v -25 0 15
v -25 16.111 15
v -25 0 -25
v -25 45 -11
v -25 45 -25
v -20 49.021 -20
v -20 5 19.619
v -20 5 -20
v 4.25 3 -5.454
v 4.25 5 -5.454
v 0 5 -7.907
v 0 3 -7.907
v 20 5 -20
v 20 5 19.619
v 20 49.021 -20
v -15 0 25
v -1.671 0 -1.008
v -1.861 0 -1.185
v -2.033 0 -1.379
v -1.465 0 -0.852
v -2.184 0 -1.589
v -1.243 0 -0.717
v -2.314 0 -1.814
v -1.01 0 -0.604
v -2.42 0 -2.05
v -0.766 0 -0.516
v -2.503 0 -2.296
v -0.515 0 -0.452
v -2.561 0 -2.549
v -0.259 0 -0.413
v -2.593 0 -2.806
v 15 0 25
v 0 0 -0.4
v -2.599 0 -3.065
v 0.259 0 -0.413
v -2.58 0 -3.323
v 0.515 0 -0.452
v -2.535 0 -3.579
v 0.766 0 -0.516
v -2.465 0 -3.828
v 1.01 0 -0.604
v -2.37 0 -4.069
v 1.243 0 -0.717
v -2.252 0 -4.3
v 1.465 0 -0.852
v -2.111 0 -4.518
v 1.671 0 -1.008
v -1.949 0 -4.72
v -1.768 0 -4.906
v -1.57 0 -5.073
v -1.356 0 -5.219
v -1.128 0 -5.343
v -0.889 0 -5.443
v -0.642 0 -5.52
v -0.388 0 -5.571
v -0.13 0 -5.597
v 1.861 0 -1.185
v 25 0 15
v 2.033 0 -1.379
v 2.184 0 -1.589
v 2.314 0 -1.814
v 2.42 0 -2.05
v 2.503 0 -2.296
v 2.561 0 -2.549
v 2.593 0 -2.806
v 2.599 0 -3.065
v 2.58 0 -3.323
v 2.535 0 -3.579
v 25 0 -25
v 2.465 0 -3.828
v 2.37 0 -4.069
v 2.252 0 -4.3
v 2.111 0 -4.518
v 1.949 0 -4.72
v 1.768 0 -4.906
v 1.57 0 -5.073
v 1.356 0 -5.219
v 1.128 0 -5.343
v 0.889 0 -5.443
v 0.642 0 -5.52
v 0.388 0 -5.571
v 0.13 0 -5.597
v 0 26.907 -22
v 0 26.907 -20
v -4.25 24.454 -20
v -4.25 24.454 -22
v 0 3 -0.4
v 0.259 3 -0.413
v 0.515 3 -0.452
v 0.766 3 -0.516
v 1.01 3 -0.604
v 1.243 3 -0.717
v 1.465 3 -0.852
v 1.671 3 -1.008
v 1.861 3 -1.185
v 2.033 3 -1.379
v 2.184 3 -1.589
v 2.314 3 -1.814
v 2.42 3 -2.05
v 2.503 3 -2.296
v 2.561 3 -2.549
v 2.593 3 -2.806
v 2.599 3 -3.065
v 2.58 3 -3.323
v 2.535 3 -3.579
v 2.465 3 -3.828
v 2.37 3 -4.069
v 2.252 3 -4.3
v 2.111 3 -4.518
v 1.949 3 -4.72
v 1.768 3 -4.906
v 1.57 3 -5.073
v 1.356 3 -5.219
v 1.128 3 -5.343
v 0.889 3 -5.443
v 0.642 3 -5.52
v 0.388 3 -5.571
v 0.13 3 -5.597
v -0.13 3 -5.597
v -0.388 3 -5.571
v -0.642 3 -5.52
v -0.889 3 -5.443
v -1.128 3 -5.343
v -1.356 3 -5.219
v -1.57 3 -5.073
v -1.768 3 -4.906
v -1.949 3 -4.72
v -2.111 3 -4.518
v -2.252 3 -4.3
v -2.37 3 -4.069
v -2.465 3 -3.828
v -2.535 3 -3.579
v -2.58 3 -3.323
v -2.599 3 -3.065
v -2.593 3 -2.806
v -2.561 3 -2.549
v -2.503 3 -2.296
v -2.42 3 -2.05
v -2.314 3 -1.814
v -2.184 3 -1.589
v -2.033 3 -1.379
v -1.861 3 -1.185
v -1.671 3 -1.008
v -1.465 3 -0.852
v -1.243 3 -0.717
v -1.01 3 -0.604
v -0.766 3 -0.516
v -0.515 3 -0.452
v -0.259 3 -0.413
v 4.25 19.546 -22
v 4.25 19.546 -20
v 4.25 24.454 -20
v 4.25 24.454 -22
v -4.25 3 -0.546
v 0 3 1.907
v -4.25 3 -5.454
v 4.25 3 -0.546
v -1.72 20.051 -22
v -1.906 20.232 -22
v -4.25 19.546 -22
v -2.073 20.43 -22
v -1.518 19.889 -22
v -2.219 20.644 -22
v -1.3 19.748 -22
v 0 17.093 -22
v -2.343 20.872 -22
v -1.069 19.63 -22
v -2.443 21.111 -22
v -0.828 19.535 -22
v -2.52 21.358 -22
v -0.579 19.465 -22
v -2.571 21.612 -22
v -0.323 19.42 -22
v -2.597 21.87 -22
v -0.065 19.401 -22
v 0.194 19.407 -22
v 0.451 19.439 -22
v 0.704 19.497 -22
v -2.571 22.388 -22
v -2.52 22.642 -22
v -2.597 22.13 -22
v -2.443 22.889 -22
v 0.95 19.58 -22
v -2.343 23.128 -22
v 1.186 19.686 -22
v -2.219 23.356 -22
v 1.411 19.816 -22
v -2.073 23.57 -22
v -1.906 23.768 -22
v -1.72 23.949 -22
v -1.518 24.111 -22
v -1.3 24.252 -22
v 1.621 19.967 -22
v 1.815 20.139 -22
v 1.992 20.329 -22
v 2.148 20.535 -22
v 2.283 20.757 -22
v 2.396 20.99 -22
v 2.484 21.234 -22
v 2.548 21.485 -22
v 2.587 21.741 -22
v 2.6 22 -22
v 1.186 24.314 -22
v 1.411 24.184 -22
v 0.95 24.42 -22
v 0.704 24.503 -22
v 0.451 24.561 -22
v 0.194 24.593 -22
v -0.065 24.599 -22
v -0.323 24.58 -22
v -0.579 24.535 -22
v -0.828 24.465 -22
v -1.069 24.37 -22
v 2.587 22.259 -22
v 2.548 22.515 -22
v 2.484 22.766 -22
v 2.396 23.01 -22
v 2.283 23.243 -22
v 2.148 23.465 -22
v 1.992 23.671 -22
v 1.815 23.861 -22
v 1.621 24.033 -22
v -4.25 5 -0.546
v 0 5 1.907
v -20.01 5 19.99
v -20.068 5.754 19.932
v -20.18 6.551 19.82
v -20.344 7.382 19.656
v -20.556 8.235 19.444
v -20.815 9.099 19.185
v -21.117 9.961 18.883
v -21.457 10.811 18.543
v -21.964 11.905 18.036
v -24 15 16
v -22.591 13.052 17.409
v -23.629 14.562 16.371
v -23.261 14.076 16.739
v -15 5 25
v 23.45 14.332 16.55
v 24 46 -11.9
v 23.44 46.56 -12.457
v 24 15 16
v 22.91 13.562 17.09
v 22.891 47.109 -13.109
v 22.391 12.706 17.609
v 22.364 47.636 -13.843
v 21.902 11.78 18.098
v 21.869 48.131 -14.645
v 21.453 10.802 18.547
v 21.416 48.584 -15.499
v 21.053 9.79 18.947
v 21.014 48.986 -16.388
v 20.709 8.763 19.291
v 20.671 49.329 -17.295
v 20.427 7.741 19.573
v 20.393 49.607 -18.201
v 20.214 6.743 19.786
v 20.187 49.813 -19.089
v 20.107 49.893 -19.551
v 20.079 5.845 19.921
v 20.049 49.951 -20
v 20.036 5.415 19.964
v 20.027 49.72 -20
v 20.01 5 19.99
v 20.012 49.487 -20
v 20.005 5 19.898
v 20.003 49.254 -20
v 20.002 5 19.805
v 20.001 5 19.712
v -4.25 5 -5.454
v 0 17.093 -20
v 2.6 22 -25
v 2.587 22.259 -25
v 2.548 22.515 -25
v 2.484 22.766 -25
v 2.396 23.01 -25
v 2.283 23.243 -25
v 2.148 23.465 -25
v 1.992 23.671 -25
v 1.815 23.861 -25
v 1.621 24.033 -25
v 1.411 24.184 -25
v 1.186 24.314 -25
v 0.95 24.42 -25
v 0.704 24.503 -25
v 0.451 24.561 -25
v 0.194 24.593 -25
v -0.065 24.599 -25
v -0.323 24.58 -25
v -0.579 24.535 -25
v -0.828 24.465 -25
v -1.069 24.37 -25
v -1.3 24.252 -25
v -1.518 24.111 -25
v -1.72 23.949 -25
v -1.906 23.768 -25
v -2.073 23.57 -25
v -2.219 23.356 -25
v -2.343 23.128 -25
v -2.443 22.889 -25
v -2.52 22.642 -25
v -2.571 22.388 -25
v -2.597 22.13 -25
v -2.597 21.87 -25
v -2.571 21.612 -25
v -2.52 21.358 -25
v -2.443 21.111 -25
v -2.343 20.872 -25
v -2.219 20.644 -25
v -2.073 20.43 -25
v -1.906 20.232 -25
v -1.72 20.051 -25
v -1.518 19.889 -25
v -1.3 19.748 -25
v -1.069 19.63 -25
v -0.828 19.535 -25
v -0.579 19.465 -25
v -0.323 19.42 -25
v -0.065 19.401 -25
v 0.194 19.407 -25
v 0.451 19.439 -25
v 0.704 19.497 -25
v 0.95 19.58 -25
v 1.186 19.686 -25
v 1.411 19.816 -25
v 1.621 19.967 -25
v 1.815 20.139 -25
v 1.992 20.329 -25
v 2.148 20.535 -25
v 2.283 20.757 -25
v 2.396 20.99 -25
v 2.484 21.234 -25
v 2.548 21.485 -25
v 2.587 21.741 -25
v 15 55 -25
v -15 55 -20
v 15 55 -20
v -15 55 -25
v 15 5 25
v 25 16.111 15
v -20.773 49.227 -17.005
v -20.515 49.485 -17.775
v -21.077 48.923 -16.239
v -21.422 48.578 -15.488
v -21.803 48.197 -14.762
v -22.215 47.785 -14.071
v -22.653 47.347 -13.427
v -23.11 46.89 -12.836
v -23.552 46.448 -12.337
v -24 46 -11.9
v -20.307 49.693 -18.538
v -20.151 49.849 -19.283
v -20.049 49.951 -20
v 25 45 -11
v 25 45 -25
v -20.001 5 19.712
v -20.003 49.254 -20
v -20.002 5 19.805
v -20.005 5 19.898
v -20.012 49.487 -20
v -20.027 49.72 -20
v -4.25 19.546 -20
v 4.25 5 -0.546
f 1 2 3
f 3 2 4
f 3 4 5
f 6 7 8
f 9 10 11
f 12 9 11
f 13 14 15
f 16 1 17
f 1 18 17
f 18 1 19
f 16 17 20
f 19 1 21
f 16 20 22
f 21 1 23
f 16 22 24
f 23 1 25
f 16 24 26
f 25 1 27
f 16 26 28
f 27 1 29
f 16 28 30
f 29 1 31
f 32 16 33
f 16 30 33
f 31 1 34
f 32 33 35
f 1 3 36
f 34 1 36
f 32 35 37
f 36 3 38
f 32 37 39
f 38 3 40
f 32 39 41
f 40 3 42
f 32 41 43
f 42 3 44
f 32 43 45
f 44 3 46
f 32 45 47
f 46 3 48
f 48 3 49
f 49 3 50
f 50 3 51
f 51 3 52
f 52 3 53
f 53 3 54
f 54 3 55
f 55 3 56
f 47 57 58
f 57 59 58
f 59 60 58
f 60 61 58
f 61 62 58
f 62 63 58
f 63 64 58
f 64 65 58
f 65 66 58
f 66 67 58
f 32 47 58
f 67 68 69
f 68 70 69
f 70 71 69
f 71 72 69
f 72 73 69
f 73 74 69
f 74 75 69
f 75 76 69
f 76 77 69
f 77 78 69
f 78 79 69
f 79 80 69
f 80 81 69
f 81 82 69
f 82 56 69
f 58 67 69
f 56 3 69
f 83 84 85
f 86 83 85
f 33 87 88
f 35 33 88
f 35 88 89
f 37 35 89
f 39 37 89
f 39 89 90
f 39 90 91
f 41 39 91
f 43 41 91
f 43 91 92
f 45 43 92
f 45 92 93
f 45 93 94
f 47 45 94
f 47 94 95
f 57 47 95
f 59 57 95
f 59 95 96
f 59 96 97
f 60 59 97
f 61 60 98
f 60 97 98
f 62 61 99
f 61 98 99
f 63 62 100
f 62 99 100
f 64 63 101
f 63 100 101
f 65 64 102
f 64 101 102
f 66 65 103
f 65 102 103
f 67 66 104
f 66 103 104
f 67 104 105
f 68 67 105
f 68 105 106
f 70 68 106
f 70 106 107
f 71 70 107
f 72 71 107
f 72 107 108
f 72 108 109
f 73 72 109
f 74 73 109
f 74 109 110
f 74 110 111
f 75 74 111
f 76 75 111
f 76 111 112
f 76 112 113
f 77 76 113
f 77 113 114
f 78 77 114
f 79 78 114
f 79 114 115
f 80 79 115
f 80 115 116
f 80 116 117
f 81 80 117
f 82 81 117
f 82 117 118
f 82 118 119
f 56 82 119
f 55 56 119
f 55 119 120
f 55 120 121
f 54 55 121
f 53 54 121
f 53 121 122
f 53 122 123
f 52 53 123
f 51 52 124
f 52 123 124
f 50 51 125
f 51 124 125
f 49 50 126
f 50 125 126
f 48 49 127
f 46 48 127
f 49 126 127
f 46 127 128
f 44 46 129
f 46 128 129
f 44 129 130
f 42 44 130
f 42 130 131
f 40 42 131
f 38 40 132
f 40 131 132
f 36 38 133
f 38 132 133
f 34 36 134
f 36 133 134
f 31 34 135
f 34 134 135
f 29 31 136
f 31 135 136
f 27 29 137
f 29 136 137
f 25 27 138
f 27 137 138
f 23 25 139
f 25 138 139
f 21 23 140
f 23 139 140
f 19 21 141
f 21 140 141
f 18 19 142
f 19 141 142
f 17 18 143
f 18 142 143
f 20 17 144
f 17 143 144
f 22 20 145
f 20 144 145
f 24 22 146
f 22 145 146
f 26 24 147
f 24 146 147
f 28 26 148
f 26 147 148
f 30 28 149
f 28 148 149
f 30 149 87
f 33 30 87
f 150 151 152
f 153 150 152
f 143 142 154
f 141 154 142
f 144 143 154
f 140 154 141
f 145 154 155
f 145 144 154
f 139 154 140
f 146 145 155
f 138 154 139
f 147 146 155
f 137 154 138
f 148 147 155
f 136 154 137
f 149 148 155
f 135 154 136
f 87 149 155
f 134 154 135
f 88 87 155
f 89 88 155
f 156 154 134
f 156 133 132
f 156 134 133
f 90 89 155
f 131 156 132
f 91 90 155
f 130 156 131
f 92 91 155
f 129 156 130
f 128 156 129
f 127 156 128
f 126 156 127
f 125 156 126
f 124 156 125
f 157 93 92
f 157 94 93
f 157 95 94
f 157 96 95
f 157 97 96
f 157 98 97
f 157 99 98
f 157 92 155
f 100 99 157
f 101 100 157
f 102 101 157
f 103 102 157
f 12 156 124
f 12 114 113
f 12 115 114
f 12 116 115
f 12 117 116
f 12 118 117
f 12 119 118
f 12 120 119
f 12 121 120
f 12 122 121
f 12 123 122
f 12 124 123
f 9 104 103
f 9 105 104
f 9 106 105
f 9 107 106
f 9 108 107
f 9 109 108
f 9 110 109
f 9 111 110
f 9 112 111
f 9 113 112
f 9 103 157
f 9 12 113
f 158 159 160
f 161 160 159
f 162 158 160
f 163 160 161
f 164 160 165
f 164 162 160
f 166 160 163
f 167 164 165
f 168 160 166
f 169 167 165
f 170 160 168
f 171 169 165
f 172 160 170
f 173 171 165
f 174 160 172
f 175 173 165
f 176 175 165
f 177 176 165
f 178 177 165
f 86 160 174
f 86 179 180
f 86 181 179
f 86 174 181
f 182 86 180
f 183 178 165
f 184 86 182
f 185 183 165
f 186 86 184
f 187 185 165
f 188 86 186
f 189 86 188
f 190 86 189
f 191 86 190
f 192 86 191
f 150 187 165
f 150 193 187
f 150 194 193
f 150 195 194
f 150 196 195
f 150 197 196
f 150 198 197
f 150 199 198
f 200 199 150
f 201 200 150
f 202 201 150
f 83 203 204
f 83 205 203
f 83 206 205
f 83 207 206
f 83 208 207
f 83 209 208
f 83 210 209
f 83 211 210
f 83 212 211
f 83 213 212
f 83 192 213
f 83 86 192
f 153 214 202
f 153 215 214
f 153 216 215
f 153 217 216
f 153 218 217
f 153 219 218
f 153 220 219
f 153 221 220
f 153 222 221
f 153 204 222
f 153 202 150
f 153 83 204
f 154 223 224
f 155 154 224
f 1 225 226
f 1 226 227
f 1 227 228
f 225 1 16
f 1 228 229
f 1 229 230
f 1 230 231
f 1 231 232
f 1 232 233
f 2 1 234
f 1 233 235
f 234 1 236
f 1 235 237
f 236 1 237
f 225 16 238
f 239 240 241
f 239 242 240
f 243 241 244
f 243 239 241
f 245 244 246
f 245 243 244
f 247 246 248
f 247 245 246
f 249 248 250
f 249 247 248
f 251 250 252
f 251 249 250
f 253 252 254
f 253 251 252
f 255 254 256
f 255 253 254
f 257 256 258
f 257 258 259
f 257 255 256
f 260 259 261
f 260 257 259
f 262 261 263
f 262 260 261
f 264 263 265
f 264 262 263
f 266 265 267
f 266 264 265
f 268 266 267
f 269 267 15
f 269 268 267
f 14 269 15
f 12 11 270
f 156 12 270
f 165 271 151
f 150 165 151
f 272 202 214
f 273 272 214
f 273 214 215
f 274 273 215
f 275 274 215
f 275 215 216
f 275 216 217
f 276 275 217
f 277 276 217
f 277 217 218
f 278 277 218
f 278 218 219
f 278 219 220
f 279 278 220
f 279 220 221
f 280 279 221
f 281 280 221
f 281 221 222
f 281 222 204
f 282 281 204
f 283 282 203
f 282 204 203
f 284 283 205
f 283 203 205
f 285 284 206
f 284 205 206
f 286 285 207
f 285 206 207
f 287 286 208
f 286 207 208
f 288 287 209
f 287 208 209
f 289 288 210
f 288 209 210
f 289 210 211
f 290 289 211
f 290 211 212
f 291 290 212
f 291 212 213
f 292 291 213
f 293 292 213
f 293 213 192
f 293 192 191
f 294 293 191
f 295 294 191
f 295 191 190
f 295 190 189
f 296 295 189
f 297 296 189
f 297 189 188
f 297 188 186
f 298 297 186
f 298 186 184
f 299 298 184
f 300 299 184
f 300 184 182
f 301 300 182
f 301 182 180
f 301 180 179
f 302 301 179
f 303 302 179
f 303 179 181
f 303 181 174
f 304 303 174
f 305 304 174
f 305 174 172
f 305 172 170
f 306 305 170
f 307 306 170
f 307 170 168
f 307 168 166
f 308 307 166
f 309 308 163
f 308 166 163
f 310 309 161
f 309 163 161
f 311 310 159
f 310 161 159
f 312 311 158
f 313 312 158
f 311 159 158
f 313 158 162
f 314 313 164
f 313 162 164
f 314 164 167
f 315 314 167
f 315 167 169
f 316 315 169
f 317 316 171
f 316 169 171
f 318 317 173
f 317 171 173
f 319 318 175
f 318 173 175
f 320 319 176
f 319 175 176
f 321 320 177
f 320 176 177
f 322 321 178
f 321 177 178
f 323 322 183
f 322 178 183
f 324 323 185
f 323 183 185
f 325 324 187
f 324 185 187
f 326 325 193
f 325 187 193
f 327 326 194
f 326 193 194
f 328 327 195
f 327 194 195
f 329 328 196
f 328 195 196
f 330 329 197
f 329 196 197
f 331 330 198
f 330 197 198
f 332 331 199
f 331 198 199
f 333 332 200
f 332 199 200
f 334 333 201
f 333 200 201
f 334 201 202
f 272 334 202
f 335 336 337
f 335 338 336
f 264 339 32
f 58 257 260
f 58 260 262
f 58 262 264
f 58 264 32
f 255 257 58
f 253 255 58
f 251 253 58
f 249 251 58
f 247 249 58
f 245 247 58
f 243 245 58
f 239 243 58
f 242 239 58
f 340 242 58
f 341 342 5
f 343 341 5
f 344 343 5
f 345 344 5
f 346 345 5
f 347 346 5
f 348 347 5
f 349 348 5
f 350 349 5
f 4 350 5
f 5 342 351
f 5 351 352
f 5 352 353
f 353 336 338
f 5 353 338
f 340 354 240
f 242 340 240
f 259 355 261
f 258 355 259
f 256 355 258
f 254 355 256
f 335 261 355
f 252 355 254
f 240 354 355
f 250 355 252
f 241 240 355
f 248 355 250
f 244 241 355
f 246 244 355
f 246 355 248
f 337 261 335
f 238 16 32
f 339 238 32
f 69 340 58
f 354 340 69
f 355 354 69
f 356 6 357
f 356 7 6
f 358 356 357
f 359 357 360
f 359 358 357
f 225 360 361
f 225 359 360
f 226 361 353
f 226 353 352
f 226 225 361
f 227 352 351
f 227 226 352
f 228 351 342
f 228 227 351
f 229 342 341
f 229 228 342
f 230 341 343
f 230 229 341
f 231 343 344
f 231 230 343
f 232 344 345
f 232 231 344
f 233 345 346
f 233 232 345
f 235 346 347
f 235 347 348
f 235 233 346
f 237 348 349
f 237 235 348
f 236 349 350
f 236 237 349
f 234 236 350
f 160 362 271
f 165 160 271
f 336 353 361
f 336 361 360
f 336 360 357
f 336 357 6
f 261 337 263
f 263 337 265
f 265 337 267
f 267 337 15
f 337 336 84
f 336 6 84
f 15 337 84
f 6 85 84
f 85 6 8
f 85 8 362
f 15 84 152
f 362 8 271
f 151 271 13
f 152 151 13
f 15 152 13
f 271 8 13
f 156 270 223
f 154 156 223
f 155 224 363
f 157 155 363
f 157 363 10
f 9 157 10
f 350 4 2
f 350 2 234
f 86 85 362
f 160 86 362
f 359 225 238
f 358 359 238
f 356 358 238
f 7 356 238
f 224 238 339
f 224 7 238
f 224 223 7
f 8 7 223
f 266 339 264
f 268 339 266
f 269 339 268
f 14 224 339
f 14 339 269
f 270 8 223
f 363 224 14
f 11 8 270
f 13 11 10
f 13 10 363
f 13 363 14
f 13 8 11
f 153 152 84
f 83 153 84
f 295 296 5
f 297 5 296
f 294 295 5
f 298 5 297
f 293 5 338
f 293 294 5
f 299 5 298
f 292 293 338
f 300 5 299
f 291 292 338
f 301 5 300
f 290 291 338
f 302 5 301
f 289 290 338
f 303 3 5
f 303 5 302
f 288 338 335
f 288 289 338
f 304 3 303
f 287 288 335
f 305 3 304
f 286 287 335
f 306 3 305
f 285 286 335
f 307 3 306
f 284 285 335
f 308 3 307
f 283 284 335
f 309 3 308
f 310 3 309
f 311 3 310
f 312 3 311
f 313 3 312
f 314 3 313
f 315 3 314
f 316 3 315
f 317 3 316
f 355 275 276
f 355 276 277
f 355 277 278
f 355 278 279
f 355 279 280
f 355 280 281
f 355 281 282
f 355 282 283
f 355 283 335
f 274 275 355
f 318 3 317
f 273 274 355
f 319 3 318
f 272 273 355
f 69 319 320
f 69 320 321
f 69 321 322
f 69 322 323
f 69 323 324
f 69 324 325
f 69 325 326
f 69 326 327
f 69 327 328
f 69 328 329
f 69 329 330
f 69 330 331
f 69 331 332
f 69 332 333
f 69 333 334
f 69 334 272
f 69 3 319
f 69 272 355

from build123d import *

# Parameters (mm, degrees)
SKETCH1_W               = 50
SKETCH1_H               = 50
BOSS_EXTRUDE1_DEPTH     = 5
SKETCH2_W               = 50
SKETCH2_H               = 5
BOSS_EXTRUDE2_DEPTH     = 50
SKETCH3_R               = 2.6
CUT_EXTRUDE1_DEPTH      = 50
SKETCH4_R               = 2.6
CUT_EXTRUDE2_DEPTH      = 50
CHAMFER1_SIZE           = 10
CUT_EXTRUDE3_DEPTH      = 2
CUT_EXTRUDE4_DEPTH      = 2
BOSS_EXTRUDE3_DEPTH     = 5
BOSS_EXTRUDE4_START     = -50
BOSS_EXTRUDE4_DEPTH     = 5
CUT_EXTRUDE5_DEPTH      = 66.383484153
CUT_EXTRUDE5_DEPTH_BACK = 66.383484153
CUT_EXTRUDE6_DEPTH      = 79.421935707
CUT_EXTRUDE6_DEPTH_BACK = 79.421935707
FILLET1_R               = 4


with BuildPart() as part:
    # Sketch1 → Boss-Extrude1 (new body)
    with BuildSketch(Plane(origin=(0, 0, 0), x_dir=(1, 0, 0), z_dir=(0, 1, 0))):
        Rectangle(SKETCH1_W, SKETCH1_H)
    extrude(amount=BOSS_EXTRUDE1_DEPTH)

    # Sketch2 → Boss-Extrude2 (add)
    with BuildSketch(Plane(origin=(0, 5, 0), x_dir=(1, 0, 0), z_dir=(0, 1, 0))):
        with Locations((0, 22.5)):
            Rectangle(SKETCH2_W, SKETCH2_H)
    extrude(amount=BOSS_EXTRUDE2_DEPTH)

    # Sketch3 → Cut-Extrude1 (cut)
    with BuildSketch(Plane.XY.offset(-20)):
        with Locations((0, 22)):
            Circle(SKETCH3_R)
    extrude(amount=-CUT_EXTRUDE1_DEPTH, mode=Mode.SUBTRACT)

    # Sketch4 → Cut-Extrude2 (cut)
    with BuildSketch(Plane(origin=(0, 5, 0), x_dir=(1, 0, 0), z_dir=(0, 1, 0))):
        with Locations(Location((0, 3, 0), (0, 0, 270))):
            Circle(SKETCH4_R)
    extrude(amount=-CUT_EXTRUDE2_DEPTH, mode=Mode.SUBTRACT)

    # Chamfer1
    chamfer1_edges = [part.edges().sort_by_distance(p)[0] for p in [
        (25, 55, -22.5),
        (-25, 55, -22.5),
        (25, 2.5, 25),
        (-25, 2.5, 25),
    ]]
    chamfer(chamfer1_edges, length=CHAMFER1_SIZE)

    # Sketch5 → Cut-Extrude3 (cut)
    with BuildSketch(Plane.XY.offset(-20)):
        Polygon((0, 26.907477288), (-4.25, 24.453738644), (-4.25, 19.546261356), (0, 17.092522712), (4.25, 19.546261356), (4.25, 24.453738644), align=None)
    extrude(amount=-CUT_EXTRUDE3_DEPTH, mode=Mode.SUBTRACT)

    # Sketch6 → Cut-Extrude4 (cut)
    with BuildSketch(Plane(origin=(0, 5, 0), x_dir=(1, 0, 0), z_dir=(0, 1, 0))):
        Polygon((0, 7.907477288), (-4.25, 5.453738644), (-4.25, 0.546261356), (0, -1.907477288), (4.25, 0.546261356), (4.25, 5.453738644), align=None)
    extrude(amount=-CUT_EXTRUDE4_DEPTH, mode=Mode.SUBTRACT)

    # Sketch7 → Boss-Extrude3 (add)
    with BuildSketch(Plane.ZY.offset(25)):
        Polygon((-20, 55), (25, 5), (-20, 5), align=None)
    extrude(amount=-BOSS_EXTRUDE3_DEPTH)

    # Sketch7<2> → Boss-Extrude4 (add)
    with BuildSketch(Plane.ZY.offset(25).offset(BOSS_EXTRUDE4_START)):
        Polygon((-20, 55), (25, 5), (-20, 5), align=None)
    extrude(amount=BOSS_EXTRUDE4_DEPTH)

    # Sketch8 → Cut-Extrude5 (cut, two sides: drawn at the far end of the back side and taken through both)
    with BuildSketch(Plane.XZ.offset(-CUT_EXTRUDE5_DEPTH_BACK)):
        Polygon((-25, 15), (-15, 25), (15, 25), (25, 15), (34.688631102, 13.868509335), (41.480658752, 39.43849578), (-8.141096193, 43.673524785), (-46.895606899, 41.556010282), (-45.565833038, 17.218639636), (-29.396147425, 9.154043084), align=None)
    extrude(amount=CUT_EXTRUDE5_DEPTH + CUT_EXTRUDE5_DEPTH_BACK, mode=Mode.SUBTRACT)

    # Sketch9 → Cut-Extrude6 (cut, two sides: drawn at the far end of the back side and taken through both)
    with BuildSketch(Plane(origin=(0, 0, -25), x_dir=(-1, 0, 0), z_dir=(0, 0, -1)).offset(-CUT_EXTRUDE6_DEPTH_BACK)):
        Polygon((-25, 45), (-15, 55), (15, 55), (25, 45), (34.215912108, 41.57366901), (36.332651021, 61.374461749), (-31.078246872, 63.763955814), (-33.631649738, 52.638414759), (-28.038481557, 40.053786352), align=None)
    extrude(amount=CUT_EXTRUDE6_DEPTH + CUT_EXTRUDE6_DEPTH_BACK, mode=Mode.SUBTRACT)

    # Fillet1
    fillet1_edges = [part.edges().sort_by_distance(p)[0] for p in [
        (20, 30.277777778, 2.25),
        (-20, 30.277777778, 2.25),
    ]]
    fillet(fillet1_edges, radius=FILLET1_R)


solid = part.part
